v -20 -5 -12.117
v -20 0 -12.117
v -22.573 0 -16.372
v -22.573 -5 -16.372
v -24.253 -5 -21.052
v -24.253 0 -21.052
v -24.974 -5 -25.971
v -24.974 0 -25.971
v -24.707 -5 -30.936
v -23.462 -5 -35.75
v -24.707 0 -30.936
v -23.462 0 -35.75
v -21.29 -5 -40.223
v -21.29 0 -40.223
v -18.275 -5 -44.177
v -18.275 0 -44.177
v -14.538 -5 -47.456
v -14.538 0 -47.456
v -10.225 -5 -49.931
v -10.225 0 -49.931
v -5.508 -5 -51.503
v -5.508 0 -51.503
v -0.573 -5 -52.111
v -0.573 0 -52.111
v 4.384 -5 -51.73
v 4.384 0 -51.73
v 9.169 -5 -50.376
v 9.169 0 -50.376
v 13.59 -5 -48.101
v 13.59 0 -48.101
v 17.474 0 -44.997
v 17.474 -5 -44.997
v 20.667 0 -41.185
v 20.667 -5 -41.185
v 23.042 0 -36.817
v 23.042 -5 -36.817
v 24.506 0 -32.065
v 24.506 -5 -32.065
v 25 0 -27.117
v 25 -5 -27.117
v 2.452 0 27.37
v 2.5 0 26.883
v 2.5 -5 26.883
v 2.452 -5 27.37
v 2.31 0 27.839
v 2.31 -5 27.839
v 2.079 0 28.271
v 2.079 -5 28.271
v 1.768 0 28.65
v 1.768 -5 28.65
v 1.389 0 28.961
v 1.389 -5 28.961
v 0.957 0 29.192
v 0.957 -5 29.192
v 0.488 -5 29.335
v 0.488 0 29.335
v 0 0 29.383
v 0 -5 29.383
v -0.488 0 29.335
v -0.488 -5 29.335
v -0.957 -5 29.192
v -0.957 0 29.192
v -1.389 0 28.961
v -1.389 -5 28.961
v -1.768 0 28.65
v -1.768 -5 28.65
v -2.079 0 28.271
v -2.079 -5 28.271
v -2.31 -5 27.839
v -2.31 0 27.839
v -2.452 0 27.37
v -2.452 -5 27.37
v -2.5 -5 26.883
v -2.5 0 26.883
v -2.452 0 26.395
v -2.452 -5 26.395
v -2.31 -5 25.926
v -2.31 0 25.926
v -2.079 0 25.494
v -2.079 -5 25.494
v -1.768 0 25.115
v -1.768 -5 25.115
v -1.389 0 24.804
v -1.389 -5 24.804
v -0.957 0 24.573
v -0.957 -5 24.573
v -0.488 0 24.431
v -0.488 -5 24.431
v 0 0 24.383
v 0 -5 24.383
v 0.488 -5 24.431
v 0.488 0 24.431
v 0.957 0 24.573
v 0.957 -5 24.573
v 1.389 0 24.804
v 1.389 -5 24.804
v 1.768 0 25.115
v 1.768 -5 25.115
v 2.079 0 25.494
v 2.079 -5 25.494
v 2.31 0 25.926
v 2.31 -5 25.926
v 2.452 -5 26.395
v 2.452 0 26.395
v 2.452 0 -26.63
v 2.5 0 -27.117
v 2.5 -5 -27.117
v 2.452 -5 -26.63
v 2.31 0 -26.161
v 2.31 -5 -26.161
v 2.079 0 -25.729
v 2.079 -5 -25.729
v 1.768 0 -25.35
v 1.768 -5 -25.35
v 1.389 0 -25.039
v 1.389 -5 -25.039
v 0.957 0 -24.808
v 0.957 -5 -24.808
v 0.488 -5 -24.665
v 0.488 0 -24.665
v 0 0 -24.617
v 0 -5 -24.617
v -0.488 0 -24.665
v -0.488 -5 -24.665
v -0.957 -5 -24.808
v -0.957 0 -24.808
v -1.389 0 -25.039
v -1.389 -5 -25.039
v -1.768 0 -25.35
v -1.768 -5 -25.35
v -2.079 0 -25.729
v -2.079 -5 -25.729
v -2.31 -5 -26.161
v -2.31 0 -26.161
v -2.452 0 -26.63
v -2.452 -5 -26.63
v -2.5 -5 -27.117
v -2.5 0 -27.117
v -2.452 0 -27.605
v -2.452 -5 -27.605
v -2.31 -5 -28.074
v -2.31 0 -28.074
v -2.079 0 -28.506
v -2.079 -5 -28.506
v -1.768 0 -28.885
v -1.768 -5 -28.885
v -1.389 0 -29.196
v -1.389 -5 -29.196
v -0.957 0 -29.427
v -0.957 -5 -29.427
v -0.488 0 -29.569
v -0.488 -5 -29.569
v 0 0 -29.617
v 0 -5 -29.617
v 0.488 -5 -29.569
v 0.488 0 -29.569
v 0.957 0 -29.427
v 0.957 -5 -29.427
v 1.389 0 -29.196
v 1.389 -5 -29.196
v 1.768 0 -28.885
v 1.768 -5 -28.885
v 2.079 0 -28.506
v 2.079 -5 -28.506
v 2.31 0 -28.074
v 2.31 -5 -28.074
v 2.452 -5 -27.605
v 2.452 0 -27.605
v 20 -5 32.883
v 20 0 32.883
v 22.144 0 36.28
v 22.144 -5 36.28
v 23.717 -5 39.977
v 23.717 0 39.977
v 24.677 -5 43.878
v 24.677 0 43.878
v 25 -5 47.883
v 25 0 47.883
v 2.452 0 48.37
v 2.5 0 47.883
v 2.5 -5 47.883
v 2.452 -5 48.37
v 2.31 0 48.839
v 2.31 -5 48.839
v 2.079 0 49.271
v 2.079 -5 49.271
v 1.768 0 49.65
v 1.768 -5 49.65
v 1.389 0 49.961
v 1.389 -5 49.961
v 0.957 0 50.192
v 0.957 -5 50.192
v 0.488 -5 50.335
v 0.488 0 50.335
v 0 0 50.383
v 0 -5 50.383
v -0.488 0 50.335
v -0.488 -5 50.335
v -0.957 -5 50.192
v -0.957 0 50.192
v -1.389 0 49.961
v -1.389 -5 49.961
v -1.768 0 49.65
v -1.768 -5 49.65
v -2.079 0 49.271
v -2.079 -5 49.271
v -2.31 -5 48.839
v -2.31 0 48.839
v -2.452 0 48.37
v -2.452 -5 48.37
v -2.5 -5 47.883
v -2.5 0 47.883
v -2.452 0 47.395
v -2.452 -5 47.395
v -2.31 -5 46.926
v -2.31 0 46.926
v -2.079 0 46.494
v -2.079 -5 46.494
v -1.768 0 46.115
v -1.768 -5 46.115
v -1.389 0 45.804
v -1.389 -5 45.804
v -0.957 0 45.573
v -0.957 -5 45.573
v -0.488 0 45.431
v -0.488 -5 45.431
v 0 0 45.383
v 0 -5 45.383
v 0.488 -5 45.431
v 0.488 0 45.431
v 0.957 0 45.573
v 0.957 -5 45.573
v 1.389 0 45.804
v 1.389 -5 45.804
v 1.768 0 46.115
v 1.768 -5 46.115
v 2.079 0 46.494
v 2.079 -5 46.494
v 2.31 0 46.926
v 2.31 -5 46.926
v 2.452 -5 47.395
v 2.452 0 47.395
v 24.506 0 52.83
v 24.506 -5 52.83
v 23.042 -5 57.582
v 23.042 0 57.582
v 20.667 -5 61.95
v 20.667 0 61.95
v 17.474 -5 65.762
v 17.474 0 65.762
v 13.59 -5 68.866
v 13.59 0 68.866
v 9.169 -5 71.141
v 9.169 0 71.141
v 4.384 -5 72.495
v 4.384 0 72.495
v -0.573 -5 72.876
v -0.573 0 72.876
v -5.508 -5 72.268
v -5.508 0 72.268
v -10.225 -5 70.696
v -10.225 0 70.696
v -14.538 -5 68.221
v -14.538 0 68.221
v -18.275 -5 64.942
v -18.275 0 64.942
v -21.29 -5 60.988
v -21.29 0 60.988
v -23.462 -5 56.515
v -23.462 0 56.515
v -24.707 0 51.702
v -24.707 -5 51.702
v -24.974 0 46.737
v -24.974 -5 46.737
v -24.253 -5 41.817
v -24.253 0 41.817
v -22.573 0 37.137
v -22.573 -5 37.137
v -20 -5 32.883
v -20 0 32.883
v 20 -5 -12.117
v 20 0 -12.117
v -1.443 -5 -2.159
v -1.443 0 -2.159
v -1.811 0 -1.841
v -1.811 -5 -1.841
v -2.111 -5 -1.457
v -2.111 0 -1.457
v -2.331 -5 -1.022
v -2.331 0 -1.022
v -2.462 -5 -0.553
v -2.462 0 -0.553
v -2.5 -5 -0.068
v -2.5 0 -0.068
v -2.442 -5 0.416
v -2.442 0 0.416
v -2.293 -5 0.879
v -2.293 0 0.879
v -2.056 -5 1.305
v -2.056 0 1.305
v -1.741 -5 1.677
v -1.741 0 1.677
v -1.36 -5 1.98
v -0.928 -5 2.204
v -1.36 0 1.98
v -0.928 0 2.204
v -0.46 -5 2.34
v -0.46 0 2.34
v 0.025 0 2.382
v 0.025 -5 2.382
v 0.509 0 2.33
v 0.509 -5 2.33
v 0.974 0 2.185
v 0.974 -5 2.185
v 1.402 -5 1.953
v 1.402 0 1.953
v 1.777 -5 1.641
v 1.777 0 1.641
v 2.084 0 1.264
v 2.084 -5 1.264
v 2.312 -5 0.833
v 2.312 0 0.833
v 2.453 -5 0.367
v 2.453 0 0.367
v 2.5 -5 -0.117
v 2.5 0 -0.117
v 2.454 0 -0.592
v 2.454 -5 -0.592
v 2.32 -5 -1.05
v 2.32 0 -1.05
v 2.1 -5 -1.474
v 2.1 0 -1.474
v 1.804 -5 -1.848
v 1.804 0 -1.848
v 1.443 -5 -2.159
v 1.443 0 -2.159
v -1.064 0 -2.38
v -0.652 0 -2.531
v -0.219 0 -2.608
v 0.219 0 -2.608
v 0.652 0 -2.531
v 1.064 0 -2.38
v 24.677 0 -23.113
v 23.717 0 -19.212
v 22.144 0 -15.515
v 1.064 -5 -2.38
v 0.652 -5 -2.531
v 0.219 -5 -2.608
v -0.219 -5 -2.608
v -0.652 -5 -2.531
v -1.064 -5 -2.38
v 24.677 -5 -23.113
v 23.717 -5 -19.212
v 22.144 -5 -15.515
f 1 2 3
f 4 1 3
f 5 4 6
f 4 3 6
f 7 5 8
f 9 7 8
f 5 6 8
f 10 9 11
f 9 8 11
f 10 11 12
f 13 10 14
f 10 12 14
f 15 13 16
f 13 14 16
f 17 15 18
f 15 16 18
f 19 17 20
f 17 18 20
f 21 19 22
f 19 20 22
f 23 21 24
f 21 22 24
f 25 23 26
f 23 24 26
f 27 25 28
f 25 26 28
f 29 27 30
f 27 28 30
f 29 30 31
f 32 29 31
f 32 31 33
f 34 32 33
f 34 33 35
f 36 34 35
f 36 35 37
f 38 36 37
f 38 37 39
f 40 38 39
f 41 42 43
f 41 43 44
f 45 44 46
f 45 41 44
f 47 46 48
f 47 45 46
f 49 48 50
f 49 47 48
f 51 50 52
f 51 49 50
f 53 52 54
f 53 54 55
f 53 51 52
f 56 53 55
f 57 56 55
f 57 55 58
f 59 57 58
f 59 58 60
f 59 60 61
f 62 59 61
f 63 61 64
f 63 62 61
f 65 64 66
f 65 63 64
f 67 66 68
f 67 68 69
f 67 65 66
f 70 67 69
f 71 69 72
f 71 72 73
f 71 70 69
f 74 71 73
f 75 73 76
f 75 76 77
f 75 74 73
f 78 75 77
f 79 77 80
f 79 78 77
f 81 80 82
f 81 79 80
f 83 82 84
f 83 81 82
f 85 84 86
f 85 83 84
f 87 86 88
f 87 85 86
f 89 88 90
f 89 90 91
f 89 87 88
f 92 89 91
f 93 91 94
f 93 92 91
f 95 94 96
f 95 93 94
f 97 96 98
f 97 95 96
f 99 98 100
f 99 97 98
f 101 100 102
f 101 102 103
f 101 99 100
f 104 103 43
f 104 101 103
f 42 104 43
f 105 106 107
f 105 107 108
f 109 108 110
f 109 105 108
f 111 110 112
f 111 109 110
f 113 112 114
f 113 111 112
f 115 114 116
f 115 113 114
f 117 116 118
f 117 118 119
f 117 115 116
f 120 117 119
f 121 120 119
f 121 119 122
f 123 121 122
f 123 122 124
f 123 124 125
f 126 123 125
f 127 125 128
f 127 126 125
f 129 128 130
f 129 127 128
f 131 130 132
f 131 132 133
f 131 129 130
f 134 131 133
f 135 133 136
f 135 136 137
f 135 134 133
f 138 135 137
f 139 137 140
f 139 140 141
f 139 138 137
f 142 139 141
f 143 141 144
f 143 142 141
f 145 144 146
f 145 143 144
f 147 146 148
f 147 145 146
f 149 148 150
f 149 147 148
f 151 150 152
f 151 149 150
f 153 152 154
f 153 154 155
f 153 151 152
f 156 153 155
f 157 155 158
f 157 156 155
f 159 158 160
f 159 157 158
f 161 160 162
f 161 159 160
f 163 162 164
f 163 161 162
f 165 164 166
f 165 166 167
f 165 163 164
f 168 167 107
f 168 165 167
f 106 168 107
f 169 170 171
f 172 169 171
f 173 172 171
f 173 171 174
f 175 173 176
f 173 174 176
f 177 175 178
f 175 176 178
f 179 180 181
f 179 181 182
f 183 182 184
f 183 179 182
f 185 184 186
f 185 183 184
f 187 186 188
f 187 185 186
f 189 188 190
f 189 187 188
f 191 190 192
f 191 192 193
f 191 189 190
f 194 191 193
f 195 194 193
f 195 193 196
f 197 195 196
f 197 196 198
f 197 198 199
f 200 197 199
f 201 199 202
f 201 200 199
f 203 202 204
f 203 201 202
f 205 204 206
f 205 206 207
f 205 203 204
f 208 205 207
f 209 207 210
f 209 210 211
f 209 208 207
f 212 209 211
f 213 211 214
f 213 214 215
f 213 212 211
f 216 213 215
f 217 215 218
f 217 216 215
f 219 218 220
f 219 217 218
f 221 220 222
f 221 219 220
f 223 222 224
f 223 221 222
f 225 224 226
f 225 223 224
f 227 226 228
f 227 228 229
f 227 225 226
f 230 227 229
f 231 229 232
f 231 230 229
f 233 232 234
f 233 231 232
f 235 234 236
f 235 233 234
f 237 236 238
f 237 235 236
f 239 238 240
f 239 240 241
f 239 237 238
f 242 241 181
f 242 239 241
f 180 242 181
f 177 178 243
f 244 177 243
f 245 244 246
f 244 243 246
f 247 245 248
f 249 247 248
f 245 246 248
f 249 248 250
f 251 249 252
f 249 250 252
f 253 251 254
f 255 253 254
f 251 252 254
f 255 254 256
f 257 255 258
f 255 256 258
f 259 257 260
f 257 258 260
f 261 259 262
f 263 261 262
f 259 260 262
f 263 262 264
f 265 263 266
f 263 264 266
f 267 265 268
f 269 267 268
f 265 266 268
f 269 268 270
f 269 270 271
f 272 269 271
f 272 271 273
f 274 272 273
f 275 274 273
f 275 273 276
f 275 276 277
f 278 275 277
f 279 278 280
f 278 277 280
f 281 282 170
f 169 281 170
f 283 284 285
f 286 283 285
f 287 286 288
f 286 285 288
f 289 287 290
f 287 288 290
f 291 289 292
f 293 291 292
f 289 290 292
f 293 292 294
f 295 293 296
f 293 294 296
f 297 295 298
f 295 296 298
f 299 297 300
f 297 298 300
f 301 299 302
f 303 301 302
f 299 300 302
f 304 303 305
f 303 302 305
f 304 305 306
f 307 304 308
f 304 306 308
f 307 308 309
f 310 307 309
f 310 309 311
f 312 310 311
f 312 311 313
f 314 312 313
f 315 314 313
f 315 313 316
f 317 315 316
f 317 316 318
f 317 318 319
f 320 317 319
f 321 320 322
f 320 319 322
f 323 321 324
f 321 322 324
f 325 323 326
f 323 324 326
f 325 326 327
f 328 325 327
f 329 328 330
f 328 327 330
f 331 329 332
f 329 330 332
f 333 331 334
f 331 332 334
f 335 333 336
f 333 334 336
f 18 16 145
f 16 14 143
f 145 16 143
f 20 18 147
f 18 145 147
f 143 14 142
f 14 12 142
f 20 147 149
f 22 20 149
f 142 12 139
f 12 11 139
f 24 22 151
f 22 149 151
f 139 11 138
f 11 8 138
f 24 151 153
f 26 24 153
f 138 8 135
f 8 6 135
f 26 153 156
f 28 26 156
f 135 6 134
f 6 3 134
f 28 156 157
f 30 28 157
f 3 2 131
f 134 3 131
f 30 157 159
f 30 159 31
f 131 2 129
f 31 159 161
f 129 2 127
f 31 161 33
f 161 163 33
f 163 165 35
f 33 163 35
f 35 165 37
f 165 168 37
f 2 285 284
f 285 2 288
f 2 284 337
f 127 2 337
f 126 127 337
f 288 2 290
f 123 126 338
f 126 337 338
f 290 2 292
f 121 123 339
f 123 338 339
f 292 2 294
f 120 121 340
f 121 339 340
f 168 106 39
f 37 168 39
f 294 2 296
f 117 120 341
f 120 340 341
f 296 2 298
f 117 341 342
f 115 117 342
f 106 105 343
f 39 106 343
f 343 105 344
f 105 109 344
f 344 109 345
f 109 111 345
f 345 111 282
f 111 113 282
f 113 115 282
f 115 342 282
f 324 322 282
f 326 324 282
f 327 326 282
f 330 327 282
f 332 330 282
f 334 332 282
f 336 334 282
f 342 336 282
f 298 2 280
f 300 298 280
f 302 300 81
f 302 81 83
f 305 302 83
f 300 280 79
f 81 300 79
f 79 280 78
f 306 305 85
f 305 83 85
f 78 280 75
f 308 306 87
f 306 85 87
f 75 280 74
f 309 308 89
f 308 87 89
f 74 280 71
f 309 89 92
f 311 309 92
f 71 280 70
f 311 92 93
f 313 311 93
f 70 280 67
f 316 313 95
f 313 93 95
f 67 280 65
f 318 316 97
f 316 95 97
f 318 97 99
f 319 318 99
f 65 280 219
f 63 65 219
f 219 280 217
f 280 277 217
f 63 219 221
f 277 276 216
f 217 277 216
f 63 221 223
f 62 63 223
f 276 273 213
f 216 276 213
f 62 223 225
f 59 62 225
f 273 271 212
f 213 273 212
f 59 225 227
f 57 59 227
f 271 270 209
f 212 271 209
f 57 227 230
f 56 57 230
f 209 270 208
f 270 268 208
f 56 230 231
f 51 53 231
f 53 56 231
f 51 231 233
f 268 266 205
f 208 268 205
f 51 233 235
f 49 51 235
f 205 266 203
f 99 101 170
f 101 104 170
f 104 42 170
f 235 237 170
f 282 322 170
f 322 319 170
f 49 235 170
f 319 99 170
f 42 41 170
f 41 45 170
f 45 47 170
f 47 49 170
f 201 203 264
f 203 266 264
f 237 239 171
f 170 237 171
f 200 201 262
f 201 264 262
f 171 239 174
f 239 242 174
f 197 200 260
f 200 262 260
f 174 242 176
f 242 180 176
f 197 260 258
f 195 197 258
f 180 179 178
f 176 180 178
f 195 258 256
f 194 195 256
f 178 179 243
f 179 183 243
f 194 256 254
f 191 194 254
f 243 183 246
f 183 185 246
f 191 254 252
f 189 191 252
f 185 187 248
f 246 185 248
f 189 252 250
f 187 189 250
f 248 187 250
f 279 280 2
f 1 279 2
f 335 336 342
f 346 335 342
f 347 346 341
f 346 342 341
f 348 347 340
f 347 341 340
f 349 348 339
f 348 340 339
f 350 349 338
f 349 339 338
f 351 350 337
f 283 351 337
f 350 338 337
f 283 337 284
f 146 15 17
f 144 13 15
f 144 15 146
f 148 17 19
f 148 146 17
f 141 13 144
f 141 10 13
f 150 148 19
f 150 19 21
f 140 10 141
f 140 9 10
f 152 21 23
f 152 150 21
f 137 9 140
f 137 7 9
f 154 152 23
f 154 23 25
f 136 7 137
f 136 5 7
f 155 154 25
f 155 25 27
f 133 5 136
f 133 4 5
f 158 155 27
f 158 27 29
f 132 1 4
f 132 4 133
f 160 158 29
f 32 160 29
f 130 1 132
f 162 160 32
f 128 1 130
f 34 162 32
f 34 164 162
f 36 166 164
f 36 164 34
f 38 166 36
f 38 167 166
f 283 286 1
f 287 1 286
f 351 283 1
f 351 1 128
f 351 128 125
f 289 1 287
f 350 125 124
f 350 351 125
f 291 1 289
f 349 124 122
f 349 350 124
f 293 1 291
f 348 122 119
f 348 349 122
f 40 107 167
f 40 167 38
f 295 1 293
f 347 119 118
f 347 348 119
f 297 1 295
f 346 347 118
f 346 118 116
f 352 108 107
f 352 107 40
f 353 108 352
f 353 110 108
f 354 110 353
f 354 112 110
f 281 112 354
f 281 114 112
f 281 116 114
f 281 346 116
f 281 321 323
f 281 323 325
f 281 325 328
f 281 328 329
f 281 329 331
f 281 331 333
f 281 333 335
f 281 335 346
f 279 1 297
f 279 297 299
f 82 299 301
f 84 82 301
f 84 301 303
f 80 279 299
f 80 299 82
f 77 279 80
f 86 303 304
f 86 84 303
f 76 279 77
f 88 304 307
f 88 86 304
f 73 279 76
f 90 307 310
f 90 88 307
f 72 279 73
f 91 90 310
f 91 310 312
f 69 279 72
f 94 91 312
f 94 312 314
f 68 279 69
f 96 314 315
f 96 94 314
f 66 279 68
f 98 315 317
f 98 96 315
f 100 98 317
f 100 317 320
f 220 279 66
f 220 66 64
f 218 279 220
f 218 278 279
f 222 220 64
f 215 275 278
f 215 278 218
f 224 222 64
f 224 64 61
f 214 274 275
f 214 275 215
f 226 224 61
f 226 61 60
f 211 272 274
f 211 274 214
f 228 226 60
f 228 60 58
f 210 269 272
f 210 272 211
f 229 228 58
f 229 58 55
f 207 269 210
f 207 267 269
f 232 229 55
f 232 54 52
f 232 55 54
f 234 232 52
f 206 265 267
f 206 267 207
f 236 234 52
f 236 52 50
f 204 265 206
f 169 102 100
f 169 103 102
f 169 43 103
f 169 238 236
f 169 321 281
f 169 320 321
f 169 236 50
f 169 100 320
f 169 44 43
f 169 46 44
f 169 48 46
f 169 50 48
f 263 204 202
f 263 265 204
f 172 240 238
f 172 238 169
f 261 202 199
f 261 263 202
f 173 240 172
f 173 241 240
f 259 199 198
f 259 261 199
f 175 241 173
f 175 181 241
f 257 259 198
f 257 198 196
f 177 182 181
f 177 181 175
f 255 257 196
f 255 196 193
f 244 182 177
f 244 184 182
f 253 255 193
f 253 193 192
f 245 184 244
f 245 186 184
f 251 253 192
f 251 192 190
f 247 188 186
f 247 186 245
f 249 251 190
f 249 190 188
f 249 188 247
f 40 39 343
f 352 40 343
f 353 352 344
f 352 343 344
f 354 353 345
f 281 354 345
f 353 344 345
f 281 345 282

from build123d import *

# Parameters (mm, degrees)
F0_R     = 2.5
F1_DEPTH = 5


with BuildPart() as f1:
    # F0 (on Front) → F1 (new body)
    with BuildSketch(Plane.XZ):
        with BuildLine():
            ThreePointArc((20, 32.8825393335), (23.7170824513, 39.9768451831), (25, 47.8825393335))
            ThreePointArc((25, 47.8825393335), (-7.9056941504, 71.5996217848), (-20, 32.8825393335))
            Line((-20, 32.8825393335), (20, 32.8825393335))
        make_face()
        with Locations((0, 47.8825393335)):
            Circle(F0_R, mode=Mode.SUBTRACT)
        with BuildLine():
            Line((20, 32.8825393335), (-20, 32.8825393335))
            ThreePointArc((-20, 32.8825393335), (0, 22.8825393335), (20, 32.8825393335))
        make_face()
        with Locations((0, 26.8825393335)):
            Circle(F0_R, mode=Mode.SUBTRACT)
        with BuildLine():
            ThreePointArc((20, 32.8825393335), (0, 22.8825393335), (-20, 32.8825393335))
            Line((-20, 32.8825393335), (-20, -12.1174606665))
            ThreePointArc((-20, -12.1174606665), (-11.821177666, -5.0888483954), (-1.4427741411, -2.1591273332))
            ThreePointArc((-1.4427741411, -2.1591273332), (-1.1495791942, 2.1025545759), (2.5, -0.1174606665))
            ThreePointArc((2.5, -0.1174606665), (2.2200152424, -1.2670398606), (1.4427741411, -2.1591273332))
            ThreePointArc((1.4427741411, -2.1591273332), (11.821177666, -5.0888483954), (20, -12.1174606665))
            Line((20, -12.1174606665), (20, 32.8825393335))
        make_face()
        with BuildLine():
            Line((20, -12.1174606665), (-20, -12.1174606665))
            ThreePointArc((-20, -12.1174606665), (-7.9056941504, -50.8345431177), (25, -27.1174606665))
            ThreePointArc((25, -27.1174606665), (23.7170824513, -19.2117665161), (20, -12.1174606665))
        make_face()
        with Locations((0, -27.1174606665)):
            Circle(F0_R, mode=Mode.SUBTRACT)
        with BuildLine():
            ThreePointArc((-1.4427741411, -2.1591273332), (-11.821177666, -5.0888483954), (-20, -12.1174606665))
            Line((-20, -12.1174606665), (20, -12.1174606665))
            ThreePointArc((20, -12.1174606665), (11.821177666, -5.0888483954), (1.4427741411, -2.1591273332))
            ThreePointArc((1.4427741411, -2.1591273332), (0, -2.6174606665), (-1.4427741411, -2.1591273332))
        make_face()
    extrude(amount=F1_DEPTH)


solid = f1.part
